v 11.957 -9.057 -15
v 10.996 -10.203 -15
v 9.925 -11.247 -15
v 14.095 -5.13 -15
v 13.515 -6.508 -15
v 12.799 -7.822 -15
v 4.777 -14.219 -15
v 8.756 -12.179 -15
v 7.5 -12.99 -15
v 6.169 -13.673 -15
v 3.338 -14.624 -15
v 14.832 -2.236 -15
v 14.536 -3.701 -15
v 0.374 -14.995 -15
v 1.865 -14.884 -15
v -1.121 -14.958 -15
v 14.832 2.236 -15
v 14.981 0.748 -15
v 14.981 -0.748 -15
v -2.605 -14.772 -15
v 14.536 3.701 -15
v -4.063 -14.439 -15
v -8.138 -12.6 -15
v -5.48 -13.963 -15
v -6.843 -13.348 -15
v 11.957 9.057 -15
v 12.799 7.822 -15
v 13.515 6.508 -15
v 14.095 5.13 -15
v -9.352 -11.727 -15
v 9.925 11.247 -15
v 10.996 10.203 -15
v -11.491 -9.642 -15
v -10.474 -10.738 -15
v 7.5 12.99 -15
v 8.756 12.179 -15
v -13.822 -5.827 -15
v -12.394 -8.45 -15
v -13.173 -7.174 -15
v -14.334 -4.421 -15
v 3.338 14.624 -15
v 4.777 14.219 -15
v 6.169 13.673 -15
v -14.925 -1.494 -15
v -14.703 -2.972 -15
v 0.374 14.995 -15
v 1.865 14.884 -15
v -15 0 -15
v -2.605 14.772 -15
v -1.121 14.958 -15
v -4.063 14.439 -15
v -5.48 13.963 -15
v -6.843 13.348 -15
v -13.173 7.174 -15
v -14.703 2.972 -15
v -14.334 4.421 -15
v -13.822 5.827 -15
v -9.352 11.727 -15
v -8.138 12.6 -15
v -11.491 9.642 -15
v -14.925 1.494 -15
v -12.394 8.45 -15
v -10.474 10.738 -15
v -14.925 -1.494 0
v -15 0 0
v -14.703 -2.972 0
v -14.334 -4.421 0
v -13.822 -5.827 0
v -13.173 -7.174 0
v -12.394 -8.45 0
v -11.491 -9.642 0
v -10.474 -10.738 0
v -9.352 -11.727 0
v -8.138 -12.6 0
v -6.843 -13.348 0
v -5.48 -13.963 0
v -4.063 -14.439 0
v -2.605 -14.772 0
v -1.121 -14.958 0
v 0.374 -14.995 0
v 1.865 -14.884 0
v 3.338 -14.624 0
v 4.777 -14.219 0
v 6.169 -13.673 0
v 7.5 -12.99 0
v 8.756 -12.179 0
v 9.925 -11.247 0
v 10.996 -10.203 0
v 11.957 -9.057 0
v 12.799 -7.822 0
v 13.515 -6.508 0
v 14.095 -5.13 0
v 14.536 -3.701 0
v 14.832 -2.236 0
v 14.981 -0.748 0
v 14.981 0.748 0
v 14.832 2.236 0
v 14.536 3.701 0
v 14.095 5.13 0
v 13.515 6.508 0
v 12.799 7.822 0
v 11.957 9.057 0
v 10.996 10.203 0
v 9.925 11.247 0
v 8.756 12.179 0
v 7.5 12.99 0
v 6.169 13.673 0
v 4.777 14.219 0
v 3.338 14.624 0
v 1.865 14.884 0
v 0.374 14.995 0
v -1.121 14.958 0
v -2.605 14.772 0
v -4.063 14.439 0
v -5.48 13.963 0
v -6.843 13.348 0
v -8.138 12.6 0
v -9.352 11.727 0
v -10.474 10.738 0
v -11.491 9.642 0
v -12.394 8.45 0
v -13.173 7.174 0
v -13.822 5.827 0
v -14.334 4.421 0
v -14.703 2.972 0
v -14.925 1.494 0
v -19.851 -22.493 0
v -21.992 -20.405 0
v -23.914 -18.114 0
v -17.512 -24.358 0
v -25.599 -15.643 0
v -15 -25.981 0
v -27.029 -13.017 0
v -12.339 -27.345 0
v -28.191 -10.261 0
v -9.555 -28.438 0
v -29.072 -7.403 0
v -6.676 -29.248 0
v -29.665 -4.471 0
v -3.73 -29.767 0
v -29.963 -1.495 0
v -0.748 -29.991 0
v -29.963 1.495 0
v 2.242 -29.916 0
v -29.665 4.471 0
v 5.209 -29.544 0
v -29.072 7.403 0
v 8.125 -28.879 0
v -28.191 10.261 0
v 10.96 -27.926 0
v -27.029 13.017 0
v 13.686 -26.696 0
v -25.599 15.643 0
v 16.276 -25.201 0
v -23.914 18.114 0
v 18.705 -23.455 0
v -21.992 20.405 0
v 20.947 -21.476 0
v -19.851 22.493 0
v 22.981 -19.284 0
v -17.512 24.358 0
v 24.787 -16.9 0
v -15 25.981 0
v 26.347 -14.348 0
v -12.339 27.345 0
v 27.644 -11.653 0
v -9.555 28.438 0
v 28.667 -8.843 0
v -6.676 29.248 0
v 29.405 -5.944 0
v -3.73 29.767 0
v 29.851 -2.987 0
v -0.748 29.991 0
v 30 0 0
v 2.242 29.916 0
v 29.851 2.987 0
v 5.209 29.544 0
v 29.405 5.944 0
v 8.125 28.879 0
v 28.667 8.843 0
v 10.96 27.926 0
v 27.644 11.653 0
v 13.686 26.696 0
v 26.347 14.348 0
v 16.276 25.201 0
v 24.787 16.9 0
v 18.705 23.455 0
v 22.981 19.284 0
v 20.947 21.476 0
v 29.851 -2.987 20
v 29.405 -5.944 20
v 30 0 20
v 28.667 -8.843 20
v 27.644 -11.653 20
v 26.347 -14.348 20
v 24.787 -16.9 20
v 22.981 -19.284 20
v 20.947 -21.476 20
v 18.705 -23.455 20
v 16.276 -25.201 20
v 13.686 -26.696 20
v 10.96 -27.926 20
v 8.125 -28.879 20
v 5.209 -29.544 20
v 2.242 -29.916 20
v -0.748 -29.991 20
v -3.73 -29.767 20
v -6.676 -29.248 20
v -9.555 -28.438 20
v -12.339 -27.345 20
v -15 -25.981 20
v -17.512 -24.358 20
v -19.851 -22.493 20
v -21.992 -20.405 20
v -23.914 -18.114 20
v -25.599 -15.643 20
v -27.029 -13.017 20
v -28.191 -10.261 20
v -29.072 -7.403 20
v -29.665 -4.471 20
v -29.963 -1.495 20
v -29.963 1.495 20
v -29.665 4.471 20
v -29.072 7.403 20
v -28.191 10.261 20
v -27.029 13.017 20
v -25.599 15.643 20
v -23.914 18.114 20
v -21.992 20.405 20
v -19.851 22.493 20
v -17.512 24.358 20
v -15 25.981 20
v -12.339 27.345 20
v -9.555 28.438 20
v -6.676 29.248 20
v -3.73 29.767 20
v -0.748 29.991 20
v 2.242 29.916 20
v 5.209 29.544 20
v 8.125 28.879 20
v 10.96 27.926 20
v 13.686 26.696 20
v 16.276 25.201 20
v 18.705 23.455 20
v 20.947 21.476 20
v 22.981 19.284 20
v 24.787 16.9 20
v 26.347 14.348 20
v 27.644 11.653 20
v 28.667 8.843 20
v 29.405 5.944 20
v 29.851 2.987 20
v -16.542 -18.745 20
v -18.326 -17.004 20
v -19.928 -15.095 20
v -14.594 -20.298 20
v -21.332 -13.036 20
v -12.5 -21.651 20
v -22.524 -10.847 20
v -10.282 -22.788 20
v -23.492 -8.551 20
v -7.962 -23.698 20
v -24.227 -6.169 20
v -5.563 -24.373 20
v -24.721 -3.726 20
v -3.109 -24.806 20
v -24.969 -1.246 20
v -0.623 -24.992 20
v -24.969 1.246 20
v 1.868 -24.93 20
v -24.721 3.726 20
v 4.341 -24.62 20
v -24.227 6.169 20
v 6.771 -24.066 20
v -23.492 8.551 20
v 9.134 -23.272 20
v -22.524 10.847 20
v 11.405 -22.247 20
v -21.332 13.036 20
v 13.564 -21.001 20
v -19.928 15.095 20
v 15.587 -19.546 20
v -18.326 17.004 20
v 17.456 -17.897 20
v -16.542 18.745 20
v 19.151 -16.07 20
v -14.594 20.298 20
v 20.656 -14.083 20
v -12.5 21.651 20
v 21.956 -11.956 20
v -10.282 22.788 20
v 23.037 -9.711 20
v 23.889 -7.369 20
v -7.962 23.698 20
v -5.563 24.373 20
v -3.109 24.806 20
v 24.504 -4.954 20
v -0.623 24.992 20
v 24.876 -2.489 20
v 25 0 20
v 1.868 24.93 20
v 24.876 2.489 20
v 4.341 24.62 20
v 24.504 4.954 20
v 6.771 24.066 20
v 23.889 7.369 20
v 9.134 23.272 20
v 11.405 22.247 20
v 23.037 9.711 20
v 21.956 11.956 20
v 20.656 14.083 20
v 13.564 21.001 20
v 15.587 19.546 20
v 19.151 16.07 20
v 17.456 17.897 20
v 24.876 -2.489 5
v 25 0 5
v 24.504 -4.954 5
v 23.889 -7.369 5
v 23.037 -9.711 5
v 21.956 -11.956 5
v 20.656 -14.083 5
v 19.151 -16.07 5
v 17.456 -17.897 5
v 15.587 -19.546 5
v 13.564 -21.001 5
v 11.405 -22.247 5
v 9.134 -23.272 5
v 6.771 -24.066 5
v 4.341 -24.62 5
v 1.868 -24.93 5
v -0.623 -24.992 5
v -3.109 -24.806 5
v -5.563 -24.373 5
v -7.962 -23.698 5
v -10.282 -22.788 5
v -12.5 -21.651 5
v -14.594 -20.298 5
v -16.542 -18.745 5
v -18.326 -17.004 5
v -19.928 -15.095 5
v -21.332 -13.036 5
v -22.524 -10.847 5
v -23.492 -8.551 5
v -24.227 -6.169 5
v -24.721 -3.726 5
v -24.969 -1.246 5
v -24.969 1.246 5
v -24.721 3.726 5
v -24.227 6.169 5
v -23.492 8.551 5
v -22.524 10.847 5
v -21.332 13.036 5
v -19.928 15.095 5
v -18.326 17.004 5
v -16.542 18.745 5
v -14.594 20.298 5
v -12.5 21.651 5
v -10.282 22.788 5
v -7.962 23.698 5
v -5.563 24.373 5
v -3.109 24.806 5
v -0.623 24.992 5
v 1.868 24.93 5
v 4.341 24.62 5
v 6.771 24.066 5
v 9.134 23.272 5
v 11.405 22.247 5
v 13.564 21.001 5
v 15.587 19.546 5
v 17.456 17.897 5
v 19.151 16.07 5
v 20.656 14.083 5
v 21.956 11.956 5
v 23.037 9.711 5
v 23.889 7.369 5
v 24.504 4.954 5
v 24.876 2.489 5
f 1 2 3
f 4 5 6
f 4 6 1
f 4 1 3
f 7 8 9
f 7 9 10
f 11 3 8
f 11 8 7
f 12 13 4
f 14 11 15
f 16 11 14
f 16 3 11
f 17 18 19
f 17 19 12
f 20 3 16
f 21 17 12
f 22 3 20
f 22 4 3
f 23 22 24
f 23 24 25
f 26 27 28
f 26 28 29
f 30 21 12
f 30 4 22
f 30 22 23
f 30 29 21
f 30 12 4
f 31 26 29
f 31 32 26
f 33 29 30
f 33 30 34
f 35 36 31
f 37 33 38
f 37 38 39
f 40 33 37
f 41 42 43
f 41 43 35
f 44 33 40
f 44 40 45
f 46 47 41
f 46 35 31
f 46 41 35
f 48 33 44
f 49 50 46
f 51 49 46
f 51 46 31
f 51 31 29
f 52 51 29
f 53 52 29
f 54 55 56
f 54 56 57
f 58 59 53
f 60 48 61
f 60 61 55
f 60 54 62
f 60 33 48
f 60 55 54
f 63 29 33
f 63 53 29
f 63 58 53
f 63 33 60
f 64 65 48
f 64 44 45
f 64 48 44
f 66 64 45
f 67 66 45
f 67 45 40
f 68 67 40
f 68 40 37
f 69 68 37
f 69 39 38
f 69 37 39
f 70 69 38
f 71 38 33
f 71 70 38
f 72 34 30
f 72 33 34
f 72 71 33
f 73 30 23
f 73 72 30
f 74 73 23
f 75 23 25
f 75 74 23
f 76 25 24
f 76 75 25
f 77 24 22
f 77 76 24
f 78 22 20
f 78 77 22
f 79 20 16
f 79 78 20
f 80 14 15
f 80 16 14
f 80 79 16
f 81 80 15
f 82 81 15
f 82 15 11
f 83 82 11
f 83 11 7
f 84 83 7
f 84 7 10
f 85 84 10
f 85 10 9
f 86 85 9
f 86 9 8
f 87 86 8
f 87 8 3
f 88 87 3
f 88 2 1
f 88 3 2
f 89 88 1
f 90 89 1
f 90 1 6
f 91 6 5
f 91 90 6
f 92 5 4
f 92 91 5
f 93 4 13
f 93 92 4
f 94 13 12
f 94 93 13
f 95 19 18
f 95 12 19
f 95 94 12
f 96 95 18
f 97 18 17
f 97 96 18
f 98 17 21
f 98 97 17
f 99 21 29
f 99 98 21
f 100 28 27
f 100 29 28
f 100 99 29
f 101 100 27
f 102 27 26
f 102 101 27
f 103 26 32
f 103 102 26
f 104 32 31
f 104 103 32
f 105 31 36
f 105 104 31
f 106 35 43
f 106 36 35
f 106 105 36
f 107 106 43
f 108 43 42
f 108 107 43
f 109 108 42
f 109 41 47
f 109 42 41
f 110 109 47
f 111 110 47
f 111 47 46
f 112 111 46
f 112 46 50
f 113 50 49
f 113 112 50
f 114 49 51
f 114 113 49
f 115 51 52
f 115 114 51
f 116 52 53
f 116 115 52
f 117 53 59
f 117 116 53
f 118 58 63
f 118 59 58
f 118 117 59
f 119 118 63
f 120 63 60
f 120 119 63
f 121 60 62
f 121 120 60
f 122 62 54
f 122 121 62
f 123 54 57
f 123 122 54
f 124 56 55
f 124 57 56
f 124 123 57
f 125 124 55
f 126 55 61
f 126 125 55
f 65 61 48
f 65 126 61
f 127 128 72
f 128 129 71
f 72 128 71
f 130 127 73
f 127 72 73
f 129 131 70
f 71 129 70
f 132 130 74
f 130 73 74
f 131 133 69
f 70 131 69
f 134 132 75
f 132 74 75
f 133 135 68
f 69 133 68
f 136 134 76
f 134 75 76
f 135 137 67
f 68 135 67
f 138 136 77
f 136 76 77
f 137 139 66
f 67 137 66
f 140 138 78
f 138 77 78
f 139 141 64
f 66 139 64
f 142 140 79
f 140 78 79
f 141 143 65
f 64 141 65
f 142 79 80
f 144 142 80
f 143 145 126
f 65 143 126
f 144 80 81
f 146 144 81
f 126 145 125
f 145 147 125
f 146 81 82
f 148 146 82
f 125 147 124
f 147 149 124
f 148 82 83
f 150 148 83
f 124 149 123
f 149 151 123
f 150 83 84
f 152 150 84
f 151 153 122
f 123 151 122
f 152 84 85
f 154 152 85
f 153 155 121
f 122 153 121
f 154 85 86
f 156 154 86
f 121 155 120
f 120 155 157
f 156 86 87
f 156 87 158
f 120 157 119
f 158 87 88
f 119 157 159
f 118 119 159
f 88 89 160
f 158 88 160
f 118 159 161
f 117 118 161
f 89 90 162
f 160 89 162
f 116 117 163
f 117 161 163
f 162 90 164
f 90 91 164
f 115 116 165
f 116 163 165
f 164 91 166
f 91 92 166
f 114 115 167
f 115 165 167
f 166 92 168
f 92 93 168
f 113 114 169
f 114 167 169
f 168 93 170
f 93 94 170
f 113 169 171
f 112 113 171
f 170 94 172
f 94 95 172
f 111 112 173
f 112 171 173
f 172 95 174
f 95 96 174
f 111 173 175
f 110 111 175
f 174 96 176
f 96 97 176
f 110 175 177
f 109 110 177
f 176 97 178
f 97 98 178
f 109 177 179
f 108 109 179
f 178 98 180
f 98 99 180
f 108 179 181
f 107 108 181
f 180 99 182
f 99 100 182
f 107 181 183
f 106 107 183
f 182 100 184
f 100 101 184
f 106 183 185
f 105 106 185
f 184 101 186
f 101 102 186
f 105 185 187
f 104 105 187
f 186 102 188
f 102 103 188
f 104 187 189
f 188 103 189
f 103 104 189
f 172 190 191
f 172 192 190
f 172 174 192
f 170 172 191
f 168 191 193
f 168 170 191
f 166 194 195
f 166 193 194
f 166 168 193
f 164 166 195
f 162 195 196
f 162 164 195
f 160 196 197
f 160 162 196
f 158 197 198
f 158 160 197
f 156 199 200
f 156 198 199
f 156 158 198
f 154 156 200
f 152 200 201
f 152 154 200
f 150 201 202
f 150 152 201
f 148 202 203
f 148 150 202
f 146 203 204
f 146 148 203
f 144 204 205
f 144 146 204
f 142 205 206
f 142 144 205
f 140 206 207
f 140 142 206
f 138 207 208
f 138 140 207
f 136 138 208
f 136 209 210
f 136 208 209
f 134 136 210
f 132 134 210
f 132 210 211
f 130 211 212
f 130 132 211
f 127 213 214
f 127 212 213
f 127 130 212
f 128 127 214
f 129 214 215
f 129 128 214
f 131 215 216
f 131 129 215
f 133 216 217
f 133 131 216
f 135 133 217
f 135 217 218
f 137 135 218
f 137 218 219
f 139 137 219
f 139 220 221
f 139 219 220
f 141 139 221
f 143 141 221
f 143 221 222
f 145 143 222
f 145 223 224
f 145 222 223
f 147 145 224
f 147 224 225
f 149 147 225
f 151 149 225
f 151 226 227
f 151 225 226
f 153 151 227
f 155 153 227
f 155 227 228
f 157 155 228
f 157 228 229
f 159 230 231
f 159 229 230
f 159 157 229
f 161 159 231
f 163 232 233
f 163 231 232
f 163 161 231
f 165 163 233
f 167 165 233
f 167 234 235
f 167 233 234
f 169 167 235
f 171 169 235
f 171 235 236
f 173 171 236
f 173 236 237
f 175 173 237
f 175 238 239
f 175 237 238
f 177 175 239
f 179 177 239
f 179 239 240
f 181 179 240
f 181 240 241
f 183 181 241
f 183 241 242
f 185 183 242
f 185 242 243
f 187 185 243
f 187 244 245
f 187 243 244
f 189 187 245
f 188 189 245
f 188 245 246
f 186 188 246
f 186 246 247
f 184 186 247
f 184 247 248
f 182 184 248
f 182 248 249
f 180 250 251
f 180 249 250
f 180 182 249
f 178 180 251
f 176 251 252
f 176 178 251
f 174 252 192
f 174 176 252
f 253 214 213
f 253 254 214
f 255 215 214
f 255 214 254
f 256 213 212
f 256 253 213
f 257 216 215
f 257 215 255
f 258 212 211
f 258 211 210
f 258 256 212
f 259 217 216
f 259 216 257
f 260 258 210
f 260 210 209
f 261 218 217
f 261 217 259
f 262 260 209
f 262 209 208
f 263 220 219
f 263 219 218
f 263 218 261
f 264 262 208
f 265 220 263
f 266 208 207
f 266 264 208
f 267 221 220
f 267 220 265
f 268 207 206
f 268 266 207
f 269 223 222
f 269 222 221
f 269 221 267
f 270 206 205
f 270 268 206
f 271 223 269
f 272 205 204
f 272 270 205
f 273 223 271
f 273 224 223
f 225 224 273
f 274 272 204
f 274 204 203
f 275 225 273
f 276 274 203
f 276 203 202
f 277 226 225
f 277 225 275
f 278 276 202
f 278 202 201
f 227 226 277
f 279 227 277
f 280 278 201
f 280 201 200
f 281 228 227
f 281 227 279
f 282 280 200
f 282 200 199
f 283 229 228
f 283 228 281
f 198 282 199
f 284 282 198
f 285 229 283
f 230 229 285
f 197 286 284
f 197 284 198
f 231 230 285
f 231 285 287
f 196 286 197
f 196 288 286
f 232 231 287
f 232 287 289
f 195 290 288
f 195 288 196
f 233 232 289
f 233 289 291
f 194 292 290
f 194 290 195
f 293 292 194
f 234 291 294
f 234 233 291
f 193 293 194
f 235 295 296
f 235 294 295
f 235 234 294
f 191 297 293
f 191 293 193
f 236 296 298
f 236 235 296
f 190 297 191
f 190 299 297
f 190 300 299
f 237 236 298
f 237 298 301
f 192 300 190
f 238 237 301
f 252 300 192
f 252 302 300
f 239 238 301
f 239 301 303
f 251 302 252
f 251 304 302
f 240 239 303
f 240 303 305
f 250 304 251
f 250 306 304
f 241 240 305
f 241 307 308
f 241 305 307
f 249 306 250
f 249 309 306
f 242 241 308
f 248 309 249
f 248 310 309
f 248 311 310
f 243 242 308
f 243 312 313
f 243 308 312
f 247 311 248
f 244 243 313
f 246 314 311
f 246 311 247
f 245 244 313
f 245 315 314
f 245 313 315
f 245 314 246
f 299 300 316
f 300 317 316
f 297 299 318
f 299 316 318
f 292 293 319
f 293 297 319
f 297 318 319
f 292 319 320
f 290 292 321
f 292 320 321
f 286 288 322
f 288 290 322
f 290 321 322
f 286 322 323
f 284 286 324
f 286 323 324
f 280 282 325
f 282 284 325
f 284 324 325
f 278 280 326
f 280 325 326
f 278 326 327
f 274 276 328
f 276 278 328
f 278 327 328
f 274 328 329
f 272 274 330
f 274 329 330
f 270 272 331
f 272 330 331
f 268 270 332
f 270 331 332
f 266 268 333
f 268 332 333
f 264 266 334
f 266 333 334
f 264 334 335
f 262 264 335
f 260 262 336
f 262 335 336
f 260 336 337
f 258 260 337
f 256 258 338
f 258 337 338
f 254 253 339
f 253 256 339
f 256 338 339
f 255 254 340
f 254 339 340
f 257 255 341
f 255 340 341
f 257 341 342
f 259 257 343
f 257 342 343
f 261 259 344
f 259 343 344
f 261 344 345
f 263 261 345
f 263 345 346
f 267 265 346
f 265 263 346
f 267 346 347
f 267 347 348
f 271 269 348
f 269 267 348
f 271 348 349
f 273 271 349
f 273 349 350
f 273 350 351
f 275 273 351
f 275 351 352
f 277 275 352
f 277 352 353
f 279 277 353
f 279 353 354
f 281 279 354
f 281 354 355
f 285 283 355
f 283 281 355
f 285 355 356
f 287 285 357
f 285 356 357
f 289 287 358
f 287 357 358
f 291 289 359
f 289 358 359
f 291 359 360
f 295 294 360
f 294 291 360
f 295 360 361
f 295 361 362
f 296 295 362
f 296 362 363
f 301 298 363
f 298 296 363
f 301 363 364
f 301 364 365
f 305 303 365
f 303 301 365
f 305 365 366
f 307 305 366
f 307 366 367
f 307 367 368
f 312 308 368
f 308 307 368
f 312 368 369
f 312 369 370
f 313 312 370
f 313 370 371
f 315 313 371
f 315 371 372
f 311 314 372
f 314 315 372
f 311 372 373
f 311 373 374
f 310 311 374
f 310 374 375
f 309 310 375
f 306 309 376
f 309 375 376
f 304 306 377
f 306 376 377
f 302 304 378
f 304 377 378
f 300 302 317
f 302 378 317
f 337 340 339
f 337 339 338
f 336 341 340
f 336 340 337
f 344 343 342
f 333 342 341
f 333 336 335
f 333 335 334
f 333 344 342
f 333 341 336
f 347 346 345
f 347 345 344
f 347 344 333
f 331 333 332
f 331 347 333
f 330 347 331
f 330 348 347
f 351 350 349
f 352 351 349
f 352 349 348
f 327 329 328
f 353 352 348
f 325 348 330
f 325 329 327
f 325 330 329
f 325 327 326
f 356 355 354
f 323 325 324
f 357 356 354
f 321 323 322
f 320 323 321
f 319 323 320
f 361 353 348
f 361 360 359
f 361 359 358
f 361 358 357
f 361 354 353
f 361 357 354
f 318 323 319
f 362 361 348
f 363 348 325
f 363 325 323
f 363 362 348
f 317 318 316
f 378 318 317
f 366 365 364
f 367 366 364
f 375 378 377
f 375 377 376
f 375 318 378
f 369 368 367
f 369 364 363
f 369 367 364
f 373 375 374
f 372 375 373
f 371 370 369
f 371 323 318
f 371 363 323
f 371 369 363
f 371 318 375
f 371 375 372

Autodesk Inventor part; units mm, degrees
ref_plane "YZ Plane" through (0, 0, 0) normal (1, 0, 0) x (0, 1, 0)
ref_plane "XZ Plane" through (0, 0, 0) normal (0, 1, 0) x (-1, 0, 0)
ref_plane "XY Plane" through (0, 0, 0) normal (0, 0, 1) x (1, 0, 0)
sketch "Esboço1" plane through (0, 0, 0) normal (0, 0, 1) x (1, 0, 0)
  circle A0 centre (0, 0) radius 25
  circle A1 centre (0, 0) radius 30
  dimension "d0" = 50
  dimension "d1" = 60
extrude "Extrusão1" add sketch "Esboço1" along normal blind 20
extrude "Extrusão2" add sketch "Esboço1" along normal blind 5 contours A0
sketch "Esboço2" plane through (0, 0, 0) normal (0, 0, -1) x (-1, 0, 0)
  circle A0 centre (0, 0) radius 15
  dimension "d6" = 30
extrude "Extrusão3" add sketch "Esboço2" along normal blind 15
properties part number "Engrenagem"
